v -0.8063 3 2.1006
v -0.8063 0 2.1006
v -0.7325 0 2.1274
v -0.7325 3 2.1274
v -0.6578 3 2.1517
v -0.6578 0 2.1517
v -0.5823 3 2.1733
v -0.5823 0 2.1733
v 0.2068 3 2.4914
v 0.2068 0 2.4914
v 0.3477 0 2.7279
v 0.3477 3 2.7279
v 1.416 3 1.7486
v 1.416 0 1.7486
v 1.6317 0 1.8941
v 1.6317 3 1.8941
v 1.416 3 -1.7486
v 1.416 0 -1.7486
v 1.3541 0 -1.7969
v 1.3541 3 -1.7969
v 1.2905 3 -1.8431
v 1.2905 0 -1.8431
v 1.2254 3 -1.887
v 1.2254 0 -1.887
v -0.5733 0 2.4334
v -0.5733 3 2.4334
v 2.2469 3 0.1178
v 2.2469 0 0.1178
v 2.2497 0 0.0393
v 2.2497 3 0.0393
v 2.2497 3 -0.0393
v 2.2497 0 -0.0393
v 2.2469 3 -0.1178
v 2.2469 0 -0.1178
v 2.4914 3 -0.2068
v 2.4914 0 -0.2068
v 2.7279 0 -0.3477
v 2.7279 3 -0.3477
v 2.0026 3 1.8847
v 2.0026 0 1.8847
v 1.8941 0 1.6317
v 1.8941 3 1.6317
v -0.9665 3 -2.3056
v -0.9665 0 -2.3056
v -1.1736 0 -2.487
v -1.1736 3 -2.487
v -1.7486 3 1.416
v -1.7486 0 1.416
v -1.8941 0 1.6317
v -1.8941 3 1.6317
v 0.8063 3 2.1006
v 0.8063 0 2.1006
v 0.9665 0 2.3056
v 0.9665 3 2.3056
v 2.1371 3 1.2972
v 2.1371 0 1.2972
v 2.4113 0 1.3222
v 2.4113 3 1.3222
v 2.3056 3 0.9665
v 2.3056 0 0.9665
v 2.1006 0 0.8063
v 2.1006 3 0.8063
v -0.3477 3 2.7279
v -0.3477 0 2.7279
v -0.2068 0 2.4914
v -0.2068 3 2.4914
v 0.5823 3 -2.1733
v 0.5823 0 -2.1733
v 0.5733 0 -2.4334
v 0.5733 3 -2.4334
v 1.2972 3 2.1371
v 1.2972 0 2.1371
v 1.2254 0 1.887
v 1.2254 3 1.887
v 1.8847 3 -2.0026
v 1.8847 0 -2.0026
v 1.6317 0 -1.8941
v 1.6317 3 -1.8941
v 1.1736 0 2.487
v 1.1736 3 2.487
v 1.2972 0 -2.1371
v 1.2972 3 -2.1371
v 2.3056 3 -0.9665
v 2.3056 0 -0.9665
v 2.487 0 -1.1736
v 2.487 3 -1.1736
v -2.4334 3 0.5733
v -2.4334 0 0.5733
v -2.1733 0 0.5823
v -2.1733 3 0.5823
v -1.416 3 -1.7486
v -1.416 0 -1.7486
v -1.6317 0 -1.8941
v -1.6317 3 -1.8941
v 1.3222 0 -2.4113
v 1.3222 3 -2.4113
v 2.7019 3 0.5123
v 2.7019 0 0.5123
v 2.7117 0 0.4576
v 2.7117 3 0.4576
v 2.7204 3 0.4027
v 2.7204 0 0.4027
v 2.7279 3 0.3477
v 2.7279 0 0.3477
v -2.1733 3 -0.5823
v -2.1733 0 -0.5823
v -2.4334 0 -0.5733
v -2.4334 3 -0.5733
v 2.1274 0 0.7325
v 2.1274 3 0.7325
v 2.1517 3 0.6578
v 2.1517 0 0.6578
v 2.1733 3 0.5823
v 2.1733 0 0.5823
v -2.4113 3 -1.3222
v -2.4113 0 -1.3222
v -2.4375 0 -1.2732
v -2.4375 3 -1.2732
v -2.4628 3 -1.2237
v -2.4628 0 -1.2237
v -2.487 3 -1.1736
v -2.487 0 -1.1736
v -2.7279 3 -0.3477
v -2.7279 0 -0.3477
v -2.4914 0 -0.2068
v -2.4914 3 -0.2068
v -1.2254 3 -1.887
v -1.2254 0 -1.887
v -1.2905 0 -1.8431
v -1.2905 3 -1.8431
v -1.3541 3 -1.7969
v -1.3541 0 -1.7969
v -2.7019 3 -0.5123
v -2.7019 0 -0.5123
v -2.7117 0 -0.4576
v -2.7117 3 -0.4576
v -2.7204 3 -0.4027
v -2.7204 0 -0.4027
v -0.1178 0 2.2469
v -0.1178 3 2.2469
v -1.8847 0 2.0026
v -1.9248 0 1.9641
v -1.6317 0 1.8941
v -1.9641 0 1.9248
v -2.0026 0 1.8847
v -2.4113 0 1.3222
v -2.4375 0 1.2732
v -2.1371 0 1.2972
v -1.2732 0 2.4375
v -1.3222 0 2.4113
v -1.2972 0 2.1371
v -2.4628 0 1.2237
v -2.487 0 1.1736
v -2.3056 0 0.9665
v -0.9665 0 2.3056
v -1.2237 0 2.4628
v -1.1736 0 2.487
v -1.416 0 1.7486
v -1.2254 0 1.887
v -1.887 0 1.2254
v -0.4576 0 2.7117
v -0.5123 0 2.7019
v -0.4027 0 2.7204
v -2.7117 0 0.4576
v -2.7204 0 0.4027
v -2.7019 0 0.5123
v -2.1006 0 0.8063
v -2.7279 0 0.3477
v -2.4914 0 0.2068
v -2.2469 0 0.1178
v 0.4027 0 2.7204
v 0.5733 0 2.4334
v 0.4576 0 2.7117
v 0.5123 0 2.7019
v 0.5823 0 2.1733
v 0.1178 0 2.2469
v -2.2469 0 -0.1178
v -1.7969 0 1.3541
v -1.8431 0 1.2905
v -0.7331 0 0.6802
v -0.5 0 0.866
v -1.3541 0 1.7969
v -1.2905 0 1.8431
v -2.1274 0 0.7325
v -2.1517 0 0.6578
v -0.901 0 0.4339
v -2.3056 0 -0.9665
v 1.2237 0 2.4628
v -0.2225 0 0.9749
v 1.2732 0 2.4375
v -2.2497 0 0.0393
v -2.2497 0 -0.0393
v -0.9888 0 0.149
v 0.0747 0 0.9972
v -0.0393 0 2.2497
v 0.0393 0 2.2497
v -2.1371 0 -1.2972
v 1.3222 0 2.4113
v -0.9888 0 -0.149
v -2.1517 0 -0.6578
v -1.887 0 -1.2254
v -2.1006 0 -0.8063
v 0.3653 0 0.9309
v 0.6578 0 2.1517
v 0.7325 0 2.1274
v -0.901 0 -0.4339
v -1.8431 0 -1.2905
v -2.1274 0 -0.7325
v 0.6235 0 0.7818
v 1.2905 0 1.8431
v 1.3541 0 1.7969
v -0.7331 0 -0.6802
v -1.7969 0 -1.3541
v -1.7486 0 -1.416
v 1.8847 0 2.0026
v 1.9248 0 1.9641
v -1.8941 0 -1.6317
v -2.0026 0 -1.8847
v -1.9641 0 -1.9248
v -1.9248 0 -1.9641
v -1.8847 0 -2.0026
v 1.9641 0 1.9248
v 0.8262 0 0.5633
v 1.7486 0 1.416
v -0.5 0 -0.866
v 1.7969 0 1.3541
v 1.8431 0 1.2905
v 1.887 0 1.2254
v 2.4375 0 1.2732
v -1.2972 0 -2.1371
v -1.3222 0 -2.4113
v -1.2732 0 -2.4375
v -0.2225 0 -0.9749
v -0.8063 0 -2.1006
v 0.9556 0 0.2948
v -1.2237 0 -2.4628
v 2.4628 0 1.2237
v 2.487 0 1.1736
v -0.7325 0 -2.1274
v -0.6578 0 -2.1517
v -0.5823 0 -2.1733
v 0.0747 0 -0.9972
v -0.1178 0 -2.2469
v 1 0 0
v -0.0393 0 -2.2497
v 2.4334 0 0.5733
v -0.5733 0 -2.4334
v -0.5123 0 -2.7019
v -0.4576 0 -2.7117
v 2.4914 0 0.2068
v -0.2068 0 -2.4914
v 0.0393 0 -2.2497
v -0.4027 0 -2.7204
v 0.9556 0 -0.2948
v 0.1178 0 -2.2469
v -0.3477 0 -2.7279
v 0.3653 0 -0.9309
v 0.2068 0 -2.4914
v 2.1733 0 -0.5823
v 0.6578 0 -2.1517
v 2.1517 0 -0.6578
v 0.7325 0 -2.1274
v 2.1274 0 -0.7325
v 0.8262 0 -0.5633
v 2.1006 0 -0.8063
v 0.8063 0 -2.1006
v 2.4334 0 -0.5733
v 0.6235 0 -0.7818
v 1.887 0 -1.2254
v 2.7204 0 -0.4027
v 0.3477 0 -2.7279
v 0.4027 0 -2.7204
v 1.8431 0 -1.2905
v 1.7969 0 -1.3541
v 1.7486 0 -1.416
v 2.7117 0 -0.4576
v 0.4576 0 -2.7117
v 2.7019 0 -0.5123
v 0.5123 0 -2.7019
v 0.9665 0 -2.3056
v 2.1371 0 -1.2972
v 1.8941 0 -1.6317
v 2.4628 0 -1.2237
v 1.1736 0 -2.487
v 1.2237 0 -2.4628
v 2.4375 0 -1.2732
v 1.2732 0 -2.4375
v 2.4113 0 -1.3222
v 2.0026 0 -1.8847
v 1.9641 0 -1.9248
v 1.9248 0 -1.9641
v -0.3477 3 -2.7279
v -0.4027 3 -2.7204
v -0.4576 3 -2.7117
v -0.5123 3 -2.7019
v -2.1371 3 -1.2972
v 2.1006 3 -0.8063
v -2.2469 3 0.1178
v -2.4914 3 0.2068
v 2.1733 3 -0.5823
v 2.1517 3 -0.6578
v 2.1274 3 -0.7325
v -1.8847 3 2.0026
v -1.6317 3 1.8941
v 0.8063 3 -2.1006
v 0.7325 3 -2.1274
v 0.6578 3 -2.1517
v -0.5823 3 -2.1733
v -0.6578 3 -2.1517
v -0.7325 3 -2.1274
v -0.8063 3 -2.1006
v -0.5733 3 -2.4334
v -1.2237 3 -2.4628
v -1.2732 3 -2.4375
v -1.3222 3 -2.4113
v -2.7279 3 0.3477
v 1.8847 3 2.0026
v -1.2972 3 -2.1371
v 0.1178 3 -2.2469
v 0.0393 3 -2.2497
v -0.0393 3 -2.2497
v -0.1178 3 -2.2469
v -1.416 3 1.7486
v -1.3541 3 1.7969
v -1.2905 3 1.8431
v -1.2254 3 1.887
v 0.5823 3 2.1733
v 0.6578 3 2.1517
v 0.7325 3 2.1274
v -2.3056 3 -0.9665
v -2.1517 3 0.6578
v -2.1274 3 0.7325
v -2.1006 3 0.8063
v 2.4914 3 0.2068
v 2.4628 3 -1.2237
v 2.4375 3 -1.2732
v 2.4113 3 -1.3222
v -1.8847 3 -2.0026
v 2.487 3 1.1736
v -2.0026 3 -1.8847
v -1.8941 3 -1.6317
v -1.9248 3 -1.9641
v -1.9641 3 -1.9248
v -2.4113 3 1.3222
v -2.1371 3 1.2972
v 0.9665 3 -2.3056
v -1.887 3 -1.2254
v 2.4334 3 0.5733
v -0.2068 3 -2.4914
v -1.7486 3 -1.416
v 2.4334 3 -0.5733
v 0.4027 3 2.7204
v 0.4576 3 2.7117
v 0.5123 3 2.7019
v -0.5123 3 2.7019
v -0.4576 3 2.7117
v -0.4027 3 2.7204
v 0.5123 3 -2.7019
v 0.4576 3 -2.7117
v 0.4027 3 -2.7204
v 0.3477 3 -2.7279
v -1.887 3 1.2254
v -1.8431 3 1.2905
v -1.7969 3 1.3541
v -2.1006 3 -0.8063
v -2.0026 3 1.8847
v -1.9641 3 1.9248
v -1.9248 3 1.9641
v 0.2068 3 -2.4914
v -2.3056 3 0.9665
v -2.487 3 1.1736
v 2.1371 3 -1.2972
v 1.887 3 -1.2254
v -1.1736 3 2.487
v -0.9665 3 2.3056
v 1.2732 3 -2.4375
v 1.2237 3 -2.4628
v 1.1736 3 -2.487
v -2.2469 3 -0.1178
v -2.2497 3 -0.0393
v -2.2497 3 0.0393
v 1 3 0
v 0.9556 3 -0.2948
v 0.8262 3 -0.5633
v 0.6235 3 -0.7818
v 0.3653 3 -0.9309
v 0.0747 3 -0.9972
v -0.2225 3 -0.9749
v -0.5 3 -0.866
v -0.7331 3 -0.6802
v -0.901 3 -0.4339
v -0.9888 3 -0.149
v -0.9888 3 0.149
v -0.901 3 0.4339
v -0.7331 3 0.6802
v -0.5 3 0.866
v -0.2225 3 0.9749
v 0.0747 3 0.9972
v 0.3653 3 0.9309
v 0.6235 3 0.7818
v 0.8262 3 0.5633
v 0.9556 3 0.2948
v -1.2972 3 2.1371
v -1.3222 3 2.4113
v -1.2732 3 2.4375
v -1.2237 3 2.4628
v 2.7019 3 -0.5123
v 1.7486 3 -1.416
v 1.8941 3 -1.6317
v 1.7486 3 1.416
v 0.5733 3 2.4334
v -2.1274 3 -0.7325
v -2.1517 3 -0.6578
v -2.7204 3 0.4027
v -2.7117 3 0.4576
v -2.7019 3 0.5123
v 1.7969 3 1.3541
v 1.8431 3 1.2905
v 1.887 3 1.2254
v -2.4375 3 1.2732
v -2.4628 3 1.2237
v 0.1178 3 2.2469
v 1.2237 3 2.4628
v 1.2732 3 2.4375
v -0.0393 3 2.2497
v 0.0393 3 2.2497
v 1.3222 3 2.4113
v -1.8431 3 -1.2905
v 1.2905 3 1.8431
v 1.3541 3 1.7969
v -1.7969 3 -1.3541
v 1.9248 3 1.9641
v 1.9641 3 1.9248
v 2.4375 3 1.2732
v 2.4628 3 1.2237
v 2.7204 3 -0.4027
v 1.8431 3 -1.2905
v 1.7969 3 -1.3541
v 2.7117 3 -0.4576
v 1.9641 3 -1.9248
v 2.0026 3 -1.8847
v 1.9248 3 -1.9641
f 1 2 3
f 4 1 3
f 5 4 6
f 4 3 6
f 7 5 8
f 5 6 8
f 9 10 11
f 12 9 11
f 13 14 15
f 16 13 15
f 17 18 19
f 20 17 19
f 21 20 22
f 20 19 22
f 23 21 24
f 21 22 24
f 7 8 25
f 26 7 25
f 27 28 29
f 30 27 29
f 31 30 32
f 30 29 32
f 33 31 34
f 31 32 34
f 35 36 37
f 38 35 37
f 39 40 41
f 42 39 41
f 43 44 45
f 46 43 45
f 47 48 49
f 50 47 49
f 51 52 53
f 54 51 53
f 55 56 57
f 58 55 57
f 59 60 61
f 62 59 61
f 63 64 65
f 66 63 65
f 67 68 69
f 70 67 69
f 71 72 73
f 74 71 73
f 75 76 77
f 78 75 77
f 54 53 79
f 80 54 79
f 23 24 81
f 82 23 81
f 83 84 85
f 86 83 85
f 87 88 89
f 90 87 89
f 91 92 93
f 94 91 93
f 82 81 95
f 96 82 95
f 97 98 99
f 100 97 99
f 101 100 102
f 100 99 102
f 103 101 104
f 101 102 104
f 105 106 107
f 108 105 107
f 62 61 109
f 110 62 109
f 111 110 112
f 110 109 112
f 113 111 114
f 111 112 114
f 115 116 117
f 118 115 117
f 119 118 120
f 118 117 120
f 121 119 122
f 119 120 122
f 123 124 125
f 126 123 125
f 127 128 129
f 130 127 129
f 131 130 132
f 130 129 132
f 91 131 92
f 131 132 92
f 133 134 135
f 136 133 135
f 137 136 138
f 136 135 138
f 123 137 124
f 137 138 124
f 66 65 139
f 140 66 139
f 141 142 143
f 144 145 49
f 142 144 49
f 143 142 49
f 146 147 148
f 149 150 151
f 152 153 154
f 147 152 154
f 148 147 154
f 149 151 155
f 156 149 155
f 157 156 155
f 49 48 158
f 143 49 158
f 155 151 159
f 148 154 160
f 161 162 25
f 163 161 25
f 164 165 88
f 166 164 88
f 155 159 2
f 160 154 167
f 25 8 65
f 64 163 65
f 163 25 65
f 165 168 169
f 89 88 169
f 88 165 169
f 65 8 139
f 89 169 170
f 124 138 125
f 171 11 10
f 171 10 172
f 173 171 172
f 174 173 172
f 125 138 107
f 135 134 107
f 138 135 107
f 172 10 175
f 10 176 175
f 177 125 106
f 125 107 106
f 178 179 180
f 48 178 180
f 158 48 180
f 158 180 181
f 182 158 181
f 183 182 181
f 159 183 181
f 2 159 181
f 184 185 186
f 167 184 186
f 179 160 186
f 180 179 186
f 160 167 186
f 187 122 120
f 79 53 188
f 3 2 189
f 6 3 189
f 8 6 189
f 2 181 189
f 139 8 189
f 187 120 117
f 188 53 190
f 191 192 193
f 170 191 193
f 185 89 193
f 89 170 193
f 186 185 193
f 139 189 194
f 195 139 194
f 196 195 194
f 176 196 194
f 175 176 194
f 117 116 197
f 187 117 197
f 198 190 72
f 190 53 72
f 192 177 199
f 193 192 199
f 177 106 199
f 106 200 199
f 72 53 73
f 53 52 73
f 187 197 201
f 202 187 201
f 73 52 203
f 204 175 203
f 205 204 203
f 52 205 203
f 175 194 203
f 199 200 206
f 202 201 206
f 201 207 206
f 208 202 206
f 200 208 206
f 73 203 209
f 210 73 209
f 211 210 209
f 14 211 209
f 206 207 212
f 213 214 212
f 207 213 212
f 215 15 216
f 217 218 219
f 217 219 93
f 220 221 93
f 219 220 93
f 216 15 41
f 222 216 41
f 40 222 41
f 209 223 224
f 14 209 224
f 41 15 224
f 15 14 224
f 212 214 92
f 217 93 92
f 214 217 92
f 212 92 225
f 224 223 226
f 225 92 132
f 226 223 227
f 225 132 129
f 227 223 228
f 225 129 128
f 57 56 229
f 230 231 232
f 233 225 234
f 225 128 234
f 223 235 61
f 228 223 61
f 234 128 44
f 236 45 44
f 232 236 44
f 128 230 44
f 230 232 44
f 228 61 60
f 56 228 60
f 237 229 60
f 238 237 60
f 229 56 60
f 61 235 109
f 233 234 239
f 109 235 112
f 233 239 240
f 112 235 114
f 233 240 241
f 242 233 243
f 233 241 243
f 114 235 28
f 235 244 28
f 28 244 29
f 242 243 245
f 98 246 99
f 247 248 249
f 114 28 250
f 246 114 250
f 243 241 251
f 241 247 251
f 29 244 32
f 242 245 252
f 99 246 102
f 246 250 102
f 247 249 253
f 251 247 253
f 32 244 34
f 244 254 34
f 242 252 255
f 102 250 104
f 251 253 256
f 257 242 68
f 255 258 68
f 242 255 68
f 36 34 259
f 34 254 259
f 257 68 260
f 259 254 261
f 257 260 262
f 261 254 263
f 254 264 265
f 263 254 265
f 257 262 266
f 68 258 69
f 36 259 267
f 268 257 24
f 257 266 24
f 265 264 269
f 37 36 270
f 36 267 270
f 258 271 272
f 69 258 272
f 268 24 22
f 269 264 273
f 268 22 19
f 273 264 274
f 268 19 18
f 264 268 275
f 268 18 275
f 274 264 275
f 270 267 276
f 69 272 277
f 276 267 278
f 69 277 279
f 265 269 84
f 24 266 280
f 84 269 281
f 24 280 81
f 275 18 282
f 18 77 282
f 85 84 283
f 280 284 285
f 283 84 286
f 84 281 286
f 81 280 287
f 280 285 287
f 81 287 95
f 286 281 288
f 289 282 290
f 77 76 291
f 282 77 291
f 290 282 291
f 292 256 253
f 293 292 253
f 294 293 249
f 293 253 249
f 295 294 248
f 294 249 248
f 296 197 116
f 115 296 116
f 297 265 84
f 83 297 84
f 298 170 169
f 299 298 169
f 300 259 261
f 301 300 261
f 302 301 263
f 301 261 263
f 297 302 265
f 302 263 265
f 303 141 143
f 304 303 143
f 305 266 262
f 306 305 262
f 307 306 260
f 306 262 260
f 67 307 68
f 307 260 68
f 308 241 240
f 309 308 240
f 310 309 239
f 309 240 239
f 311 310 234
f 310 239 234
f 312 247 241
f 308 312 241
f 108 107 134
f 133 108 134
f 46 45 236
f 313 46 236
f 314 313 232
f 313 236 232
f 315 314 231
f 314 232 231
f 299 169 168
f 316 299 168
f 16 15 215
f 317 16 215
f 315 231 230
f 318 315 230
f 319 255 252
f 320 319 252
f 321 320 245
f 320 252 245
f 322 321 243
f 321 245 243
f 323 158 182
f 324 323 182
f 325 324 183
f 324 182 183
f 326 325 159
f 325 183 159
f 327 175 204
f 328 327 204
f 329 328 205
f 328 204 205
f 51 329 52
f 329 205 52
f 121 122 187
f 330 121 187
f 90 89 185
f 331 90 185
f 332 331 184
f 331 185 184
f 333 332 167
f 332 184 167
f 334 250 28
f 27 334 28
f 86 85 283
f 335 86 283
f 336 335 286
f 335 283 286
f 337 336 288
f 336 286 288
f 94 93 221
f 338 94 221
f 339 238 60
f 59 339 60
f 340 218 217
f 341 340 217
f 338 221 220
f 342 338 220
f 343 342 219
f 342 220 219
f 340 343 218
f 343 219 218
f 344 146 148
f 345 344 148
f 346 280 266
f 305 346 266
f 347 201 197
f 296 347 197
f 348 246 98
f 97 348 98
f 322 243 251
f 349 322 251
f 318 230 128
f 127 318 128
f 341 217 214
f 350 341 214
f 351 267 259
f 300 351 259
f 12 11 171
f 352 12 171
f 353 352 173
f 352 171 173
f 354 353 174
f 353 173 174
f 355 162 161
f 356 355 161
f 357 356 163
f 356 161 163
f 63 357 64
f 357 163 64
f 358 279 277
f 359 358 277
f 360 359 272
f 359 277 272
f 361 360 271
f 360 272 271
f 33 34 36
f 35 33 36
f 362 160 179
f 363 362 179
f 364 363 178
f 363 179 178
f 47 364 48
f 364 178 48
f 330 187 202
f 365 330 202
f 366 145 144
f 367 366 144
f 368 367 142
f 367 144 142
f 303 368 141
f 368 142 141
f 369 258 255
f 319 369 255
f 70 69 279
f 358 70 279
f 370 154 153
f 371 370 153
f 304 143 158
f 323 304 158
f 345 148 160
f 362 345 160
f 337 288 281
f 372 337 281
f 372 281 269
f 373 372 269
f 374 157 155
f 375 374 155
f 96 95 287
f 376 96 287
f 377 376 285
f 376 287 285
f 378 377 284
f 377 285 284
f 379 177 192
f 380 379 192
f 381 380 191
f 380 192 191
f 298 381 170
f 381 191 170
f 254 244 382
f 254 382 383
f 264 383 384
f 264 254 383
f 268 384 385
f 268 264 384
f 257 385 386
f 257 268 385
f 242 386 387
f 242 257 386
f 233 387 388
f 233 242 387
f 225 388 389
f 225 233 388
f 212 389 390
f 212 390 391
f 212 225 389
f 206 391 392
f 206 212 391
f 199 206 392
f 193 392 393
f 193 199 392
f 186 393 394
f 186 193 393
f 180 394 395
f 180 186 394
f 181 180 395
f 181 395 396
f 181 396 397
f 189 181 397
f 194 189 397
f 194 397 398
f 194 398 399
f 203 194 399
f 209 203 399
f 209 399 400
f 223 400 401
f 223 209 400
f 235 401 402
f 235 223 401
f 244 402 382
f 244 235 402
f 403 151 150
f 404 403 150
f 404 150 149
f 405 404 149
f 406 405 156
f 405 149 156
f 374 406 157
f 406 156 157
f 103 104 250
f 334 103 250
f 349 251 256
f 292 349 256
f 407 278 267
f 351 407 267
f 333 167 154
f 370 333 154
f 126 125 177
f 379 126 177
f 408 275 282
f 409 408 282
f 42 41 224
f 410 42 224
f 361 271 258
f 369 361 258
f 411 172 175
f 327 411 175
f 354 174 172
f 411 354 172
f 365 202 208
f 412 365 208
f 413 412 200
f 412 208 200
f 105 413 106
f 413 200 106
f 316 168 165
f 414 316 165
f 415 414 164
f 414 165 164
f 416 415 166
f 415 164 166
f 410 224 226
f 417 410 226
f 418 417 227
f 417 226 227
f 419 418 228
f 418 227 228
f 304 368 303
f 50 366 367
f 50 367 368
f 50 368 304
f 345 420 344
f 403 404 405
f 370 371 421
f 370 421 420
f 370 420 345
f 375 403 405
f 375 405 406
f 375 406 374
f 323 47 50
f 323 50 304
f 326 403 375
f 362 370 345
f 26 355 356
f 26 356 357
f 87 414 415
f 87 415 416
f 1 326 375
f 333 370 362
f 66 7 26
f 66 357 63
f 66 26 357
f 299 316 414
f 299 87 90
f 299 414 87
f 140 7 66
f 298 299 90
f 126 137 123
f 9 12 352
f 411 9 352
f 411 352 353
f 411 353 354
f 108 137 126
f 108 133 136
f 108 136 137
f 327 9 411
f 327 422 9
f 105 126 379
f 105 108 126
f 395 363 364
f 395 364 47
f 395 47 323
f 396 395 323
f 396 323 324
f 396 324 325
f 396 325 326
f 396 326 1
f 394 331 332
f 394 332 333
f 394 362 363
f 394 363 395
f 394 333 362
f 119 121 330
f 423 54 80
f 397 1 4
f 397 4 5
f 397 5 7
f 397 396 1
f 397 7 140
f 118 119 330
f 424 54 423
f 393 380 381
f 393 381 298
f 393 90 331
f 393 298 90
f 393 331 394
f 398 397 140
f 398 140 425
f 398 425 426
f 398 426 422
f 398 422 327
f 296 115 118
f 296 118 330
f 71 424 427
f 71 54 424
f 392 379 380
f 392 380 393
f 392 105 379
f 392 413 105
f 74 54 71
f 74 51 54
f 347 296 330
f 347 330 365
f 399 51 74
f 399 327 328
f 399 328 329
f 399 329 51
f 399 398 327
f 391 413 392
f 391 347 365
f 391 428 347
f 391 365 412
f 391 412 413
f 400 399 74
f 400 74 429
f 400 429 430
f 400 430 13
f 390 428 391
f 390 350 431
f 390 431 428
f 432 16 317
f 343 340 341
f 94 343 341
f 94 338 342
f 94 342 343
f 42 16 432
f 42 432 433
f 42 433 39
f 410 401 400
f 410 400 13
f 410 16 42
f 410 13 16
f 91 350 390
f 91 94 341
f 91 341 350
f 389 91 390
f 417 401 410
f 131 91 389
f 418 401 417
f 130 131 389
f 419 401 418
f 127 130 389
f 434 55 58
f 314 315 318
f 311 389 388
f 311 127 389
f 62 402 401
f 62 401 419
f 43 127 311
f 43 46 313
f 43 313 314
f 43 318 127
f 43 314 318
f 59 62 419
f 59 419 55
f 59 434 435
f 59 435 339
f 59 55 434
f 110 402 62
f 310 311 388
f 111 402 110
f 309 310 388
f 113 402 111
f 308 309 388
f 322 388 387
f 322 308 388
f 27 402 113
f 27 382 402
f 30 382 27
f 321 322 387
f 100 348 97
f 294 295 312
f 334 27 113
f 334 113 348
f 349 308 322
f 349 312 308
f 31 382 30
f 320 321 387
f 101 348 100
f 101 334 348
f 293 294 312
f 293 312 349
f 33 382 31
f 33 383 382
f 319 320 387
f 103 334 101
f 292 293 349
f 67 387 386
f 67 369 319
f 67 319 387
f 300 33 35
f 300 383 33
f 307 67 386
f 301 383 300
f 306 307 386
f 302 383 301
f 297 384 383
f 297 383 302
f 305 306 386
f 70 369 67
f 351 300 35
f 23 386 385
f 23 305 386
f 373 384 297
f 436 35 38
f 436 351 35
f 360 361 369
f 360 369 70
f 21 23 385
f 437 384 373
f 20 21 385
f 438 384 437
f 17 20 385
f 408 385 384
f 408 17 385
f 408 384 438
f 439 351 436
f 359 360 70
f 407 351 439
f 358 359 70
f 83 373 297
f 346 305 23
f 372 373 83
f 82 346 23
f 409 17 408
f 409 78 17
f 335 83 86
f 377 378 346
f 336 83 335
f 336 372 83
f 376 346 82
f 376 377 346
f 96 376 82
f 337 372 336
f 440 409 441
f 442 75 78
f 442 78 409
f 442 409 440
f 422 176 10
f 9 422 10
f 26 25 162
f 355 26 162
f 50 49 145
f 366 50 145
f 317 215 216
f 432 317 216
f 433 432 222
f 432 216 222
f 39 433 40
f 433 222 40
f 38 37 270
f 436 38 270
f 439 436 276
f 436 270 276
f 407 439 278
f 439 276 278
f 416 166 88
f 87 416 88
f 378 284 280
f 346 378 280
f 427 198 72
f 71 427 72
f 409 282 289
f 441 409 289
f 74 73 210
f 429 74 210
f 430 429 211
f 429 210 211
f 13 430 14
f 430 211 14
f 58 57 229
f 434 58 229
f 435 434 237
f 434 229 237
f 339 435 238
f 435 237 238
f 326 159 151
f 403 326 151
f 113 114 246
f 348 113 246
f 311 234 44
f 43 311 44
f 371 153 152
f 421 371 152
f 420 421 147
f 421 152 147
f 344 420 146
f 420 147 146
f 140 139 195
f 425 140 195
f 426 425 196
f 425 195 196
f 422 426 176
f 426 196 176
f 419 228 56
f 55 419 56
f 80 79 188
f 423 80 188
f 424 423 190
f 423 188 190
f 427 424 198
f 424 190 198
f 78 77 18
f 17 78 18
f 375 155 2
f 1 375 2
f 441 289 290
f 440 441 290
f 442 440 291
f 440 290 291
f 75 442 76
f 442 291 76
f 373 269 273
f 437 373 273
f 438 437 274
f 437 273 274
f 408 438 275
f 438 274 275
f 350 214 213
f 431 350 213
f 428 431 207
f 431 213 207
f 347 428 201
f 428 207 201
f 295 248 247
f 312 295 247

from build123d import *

# Parameters (mm, degrees)
IZIM2_R                     = 1
Y_KSEKLIK_EKSTR_ZYON1_DEPTH = 3


with BuildPart() as part:
    # Çizim2 → Yükseklik-Ekstrüzyon1 (new body)
    with BuildSketch(Plane(origin=(0, 0, 0), x_dir=(1, 0, 0), z_dir=(0, 1, 0))):
        with BuildLine():
            Line((2.727931774, -0.347689854), (2.491435912, -0.206753706))
            Line((2.491435912, -0.206753706), (2.246916453, -0.117755902))
            ThreePointArc((2.246916453, -0.117755902), (2.25, 0), (2.246916453, 0.117755902))
            Line((2.246916453, 0.117755902), (2.491435912, 0.206753706))
            Line((2.491435912, 0.206753706), (2.727931774, 0.347689854))
            ThreePointArc((2.727931774, 0.347689854), (2.716142937, 0.430194779), (2.701859364, 0.512304577))
            Line((2.701859364, 0.512304577), (2.433386768, 0.573261578))
            Line((2.433386768, 0.573261578), (2.173333109, 0.582342851))
            ThreePointArc((2.173333109, 0.582342851), (2.139877162, 0.695288237), (2.10055596, 0.806327886))
            Line((2.10055596, 0.806327886), (2.30560595, 0.966530497))
            Line((2.30560595, 0.966530497), (2.486975217, 1.173649979))
            ThreePointArc((2.486975217, 1.173649979), (2.450267942, 1.248473874), (2.411310133, 1.322151066))
            Line((2.411310133, 1.322151066), (2.137140773, 1.297162024))
            Line((2.137140773, 1.297162024), (1.887008778, 1.225437829))
            ThreePointArc((1.887008778, 1.225437829), (1.820288237, 1.322516818), (1.748578413, 1.41597088))
            Line((1.748578413, 1.41597088), (1.894087214, 1.631696548))
            Line((1.894087214, 1.631696548), (2.002576197, 1.884725067))
            ThreePointArc((2.002576197, 1.884725067), (1.944543648, 1.944543648), (1.884725067, 2.002576197))
            Line((1.884725067, 2.002576197), (1.631696548, 1.894087214))
            Line((1.631696548, 1.894087214), (1.41597088, 1.748578413))
            ThreePointArc((1.41597088, 1.748578413), (1.322516818, 1.820288237), (1.225437829, 1.887008778))
            Line((1.225437829, 1.887008778), (1.297162024, 2.137140773))
            Line((1.297162024, 2.137140773), (1.322151066, 2.411310133))
            ThreePointArc((1.322151066, 2.411310133), (1.248473874, 2.450267942), (1.173649979, 2.486975217))
            Line((1.173649979, 2.486975217), (0.966530497, 2.30560595))
            Line((0.966530497, 2.30560595), (0.806327886, 2.10055596))
            ThreePointArc((0.806327886, 2.10055596), (0.695288237, 2.139877162), (0.582342851, 2.173333109))
            Line((0.582342851, 2.173333109), (0.573261578, 2.433386768))
            Line((0.573261578, 2.433386768), (0.512304577, 2.701859364))
            ThreePointArc((0.512304577, 2.701859364), (0.430194779, 2.716142937), (0.347689854, 2.727931774))
            Line((0.347689854, 2.727931774), (0.206753706, 2.491435912))
            Line((0.206753706, 2.491435912), (0.117755902, 2.246916453))
            ThreePointArc((0.117755902, 2.246916453), (0, 2.25), (-0.117755902, 2.246916453))
            Line((-0.117755902, 2.246916453), (-0.206753706, 2.491435912))
            Line((-0.206753706, 2.491435912), (-0.347689854, 2.727931774))
            ThreePointArc((-0.347689854, 2.727931774), (-0.430194779, 2.716142937), (-0.512304577, 2.701859364))
            Line((-0.512304577, 2.701859364), (-0.573261578, 2.433386768))
            Line((-0.573261578, 2.433386768), (-0.582342851, 2.173333109))
            ThreePointArc((-0.582342851, 2.173333109), (-0.695288237, 2.139877162), (-0.806327886, 2.10055596))
            Line((-0.806327886, 2.10055596), (-0.966530497, 2.30560595))
            Line((-0.966530497, 2.30560595), (-1.173649979, 2.486975217))
            ThreePointArc((-1.173649979, 2.486975217), (-1.248473874, 2.450267942), (-1.322151066, 2.411310133))
            Line((-1.322151066, 2.411310133), (-1.297162024, 2.137140773))
            Line((-1.297162024, 2.137140773), (-1.225437829, 1.887008778))
            ThreePointArc((-1.225437829, 1.887008778), (-1.322516818, 1.820288237), (-1.41597088, 1.748578413))
            Line((-1.41597088, 1.748578413), (-1.631696548, 1.894087214))
            Line((-1.631696548, 1.894087214), (-1.884725067, 2.002576197))
            ThreePointArc((-1.884725067, 2.002576197), (-1.944543648, 1.944543648), (-2.002576197, 1.884725067))
            Line((-2.002576197, 1.884725067), (-1.894087214, 1.631696548))
            Line((-1.894087214, 1.631696548), (-1.748578413, 1.41597088))
            ThreePointArc((-1.748578413, 1.41597088), (-1.820288237, 1.322516818), (-1.887008778, 1.225437829))
            Line((-1.887008778, 1.225437829), (-2.137140773, 1.297162024))
            Line((-2.137140773, 1.297162024), (-2.411310133, 1.322151066))
            ThreePointArc((-2.411310133, 1.322151066), (-2.450267942, 1.248473874), (-2.486975217, 1.173649979))
            Line((-2.486975217, 1.173649979), (-2.30560595, 0.966530497))
            Line((-2.30560595, 0.966530497), (-2.10055596, 0.806327886))
            ThreePointArc((-2.10055596, 0.806327886), (-2.139877162, 0.695288237), (-2.173333109, 0.582342851))
            Line((-2.173333109, 0.582342851), (-2.433386768, 0.573261578))
            Line((-2.433386768, 0.573261578), (-2.701859364, 0.512304577))
            ThreePointArc((-2.701859364, 0.512304577), (-2.716142937, 0.430194779), (-2.727931774, 0.347689854))
            Line((-2.727931774, 0.347689854), (-2.491435912, 0.206753706))
            Line((-2.491435912, 0.206753706), (-2.246916453, 0.117755902))
            ThreePointArc((-2.246916453, 0.117755902), (-2.25, 0), (-2.246916453, -0.117755902))
            Line((-2.246916453, -0.117755902), (-2.491435912, -0.206753706))
            Line((-2.491435912, -0.206753706), (-2.727931774, -0.347689854))
            ThreePointArc((-2.727931774, -0.347689854), (-2.716142937, -0.430194779), (-2.701859364, -0.512304577))
            Line((-2.701859364, -0.512304577), (-2.433386768, -0.573261578))
            Line((-2.433386768, -0.573261578), (-2.173333109, -0.582342851))
            ThreePointArc((-2.173333109, -0.582342851), (-2.139877162, -0.695288237), (-2.10055596, -0.806327886))
            Line((-2.10055596, -0.806327886), (-2.30560595, -0.966530497))
            Line((-2.30560595, -0.966530497), (-2.486975217, -1.173649979))
            ThreePointArc((-2.486975217, -1.173649979), (-2.450267942, -1.248473874), (-2.411310133, -1.322151066))
            Line((-2.411310133, -1.322151066), (-2.137140773, -1.297162024))
            Line((-2.137140773, -1.297162024), (-1.887008778, -1.225437829))
            ThreePointArc((-1.887008778, -1.225437829), (-1.820288237, -1.322516818), (-1.748578413, -1.41597088))
            Line((-1.748578413, -1.41597088), (-1.894087214, -1.631696548))
            Line((-1.894087214, -1.631696548), (-2.002576197, -1.884725067))
            ThreePointArc((-2.002576197, -1.884725067), (-1.944543648, -1.944543648), (-1.884725067, -2.002576197))
            Line((-1.884725067, -2.002576197), (-1.631696548, -1.894087214))
            Line((-1.631696548, -1.894087214), (-1.41597088, -1.748578413))
            ThreePointArc((-1.41597088, -1.748578413), (-1.322516818, -1.820288237), (-1.225437829, -1.887008778))
            Line((-1.225437829, -1.887008778), (-1.297162024, -2.137140773))
            Line((-1.297162024, -2.137140773), (-1.322151066, -2.411310133))
            ThreePointArc((-1.322151066, -2.411310133), (-1.248473874, -2.450267942), (-1.173649979, -2.486975217))
            Line((-1.173649979, -2.486975217), (-0.966530497, -2.30560595))
            Line((-0.966530497, -2.30560595), (-0.806327886, -2.10055596))
            ThreePointArc((-0.806327886, -2.10055596), (-0.695288237, -2.139877162), (-0.582342851, -2.173333109))
            Line((-0.582342851, -2.173333109), (-0.573261578, -2.433386768))
            Line((-0.573261578, -2.433386768), (-0.512304577, -2.701859364))
            ThreePointArc((-0.512304577, -2.701859364), (-0.430194779, -2.716142937), (-0.347689854, -2.727931774))
            Line((-0.347689854, -2.727931774), (-0.206753706, -2.491435912))
            Line((-0.206753706, -2.491435912), (-0.117755902, -2.246916453))
            ThreePointArc((-0.117755902, -2.246916453), (0, -2.25), (0.117755902, -2.246916453))
            Line((0.117755902, -2.246916453), (0.206753706, -2.491435912))
            Line((0.206753706, -2.491435912), (0.347689854, -2.727931774))
            ThreePointArc((0.347689854, -2.727931774), (0.430194779, -2.716142937), (0.512304577, -2.701859364))
            Line((0.512304577, -2.701859364), (0.573261578, -2.433386768))
            Line((0.573261578, -2.433386768), (0.582342851, -2.173333109))
            ThreePointArc((0.582342851, -2.173333109), (0.695288237, -2.139877162), (0.806327886, -2.10055596))
            Line((0.806327886, -2.10055596), (0.966530497, -2.30560595))
            Line((0.966530497, -2.30560595), (1.173649979, -2.486975217))
            ThreePointArc((1.173649979, -2.486975217), (1.248473874, -2.450267942), (1.322151066, -2.411310133))
            Line((1.322151066, -2.411310133), (1.297162024, -2.137140773))
            Line((1.297162024, -2.137140773), (1.225437829, -1.887008778))
            ThreePointArc((1.225437829, -1.887008778), (1.322516818, -1.820288237), (1.41597088, -1.748578413))
            Line((1.41597088, -1.748578413), (1.631696548, -1.894087214))
            Line((1.631696548, -1.894087214), (1.884725067, -2.002576197))
            ThreePointArc((1.884725067, -2.002576197), (1.944543648, -1.944543648), (2.002576197, -1.884725067))
            Line((2.002576197, -1.884725067), (1.894087214, -1.631696548))
            Line((1.894087214, -1.631696548), (1.748578413, -1.41597088))
            ThreePointArc((1.748578413, -1.41597088), (1.820288237, -1.322516818), (1.887008778, -1.225437829))
            Line((1.887008778, -1.225437829), (2.137140773, -1.297162024))
            Line((2.137140773, -1.297162024), (2.411310133, -1.322151066))
            ThreePointArc((2.411310133, -1.322151066), (2.450267942, -1.248473874), (2.486975217, -1.173649979))
            Line((2.486975217, -1.173649979), (2.30560595, -0.966530497))
            Line((2.30560595, -0.966530497), (2.10055596, -0.806327886))
            ThreePointArc((2.10055596, -0.806327886), (2.139877162, -0.695288237), (2.173333109, -0.582342851))
            Line((2.173333109, -0.582342851), (2.433386768, -0.573261578))
            Line((2.433386768, -0.573261578), (2.701859364, -0.512304577))
            ThreePointArc((2.701859364, -0.512304577), (2.716142937, -0.430194779), (2.727931774, -0.347689854))
        make_face()
        Circle(IZIM2_R, mode=Mode.SUBTRACT)
    extrude(amount=Y_KSEKLIK_EKSTR_ZYON1_DEPTH)


solid = part.part
